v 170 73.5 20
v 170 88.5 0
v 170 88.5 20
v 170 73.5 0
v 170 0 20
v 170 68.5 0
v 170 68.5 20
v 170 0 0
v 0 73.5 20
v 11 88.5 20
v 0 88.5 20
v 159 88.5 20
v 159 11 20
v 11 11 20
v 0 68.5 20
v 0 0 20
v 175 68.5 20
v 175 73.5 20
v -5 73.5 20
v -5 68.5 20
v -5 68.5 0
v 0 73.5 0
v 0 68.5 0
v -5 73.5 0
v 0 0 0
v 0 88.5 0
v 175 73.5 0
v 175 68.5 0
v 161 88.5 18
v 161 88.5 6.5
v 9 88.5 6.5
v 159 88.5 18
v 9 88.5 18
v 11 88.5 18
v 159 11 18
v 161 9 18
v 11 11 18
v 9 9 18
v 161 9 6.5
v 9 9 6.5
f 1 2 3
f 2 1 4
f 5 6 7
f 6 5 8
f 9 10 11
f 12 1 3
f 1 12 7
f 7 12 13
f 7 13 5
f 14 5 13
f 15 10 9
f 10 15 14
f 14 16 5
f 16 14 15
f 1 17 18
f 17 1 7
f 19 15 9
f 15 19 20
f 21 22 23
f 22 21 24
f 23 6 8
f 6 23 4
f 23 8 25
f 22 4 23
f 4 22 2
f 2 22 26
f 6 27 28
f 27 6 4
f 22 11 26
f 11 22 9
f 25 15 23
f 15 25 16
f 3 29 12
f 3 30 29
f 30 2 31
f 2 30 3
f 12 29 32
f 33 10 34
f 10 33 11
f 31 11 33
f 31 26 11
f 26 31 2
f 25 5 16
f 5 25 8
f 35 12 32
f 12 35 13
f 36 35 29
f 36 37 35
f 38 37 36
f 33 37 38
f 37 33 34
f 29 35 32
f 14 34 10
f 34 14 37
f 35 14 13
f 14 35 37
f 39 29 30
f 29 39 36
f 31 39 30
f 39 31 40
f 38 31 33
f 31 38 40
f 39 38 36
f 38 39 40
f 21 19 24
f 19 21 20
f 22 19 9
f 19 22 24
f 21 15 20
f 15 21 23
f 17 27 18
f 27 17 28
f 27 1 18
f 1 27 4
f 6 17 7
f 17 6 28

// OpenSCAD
//Customisable Box mobile projector from Saurabh Karanke
//Enter mobile length
length=150;
//Enter mobile width
width=73.5;
//Enter mobile thickness
thickness=9.5;
daimeter=72;//[50:72]
l=length+20;l1=length-2;l2=length+2;
w=width+20;w1=width+9;w2=width+11;
t=20;//[20:20]
tl=thickness+2;
t1=18-tl;
module mobholder(){
union(){
    difference(){
cube([l,width+15,t]);
translate([11,11,18])
cube([l1,w1,2]);
translate([9,9,t1])
cube([l2,w2,tl]);
}
translate([-5,width-5,0])
cube([5,5,20]);
translate([l,width-5,0])
cube([5,5,20]);
 }
 }
 mobholder();
